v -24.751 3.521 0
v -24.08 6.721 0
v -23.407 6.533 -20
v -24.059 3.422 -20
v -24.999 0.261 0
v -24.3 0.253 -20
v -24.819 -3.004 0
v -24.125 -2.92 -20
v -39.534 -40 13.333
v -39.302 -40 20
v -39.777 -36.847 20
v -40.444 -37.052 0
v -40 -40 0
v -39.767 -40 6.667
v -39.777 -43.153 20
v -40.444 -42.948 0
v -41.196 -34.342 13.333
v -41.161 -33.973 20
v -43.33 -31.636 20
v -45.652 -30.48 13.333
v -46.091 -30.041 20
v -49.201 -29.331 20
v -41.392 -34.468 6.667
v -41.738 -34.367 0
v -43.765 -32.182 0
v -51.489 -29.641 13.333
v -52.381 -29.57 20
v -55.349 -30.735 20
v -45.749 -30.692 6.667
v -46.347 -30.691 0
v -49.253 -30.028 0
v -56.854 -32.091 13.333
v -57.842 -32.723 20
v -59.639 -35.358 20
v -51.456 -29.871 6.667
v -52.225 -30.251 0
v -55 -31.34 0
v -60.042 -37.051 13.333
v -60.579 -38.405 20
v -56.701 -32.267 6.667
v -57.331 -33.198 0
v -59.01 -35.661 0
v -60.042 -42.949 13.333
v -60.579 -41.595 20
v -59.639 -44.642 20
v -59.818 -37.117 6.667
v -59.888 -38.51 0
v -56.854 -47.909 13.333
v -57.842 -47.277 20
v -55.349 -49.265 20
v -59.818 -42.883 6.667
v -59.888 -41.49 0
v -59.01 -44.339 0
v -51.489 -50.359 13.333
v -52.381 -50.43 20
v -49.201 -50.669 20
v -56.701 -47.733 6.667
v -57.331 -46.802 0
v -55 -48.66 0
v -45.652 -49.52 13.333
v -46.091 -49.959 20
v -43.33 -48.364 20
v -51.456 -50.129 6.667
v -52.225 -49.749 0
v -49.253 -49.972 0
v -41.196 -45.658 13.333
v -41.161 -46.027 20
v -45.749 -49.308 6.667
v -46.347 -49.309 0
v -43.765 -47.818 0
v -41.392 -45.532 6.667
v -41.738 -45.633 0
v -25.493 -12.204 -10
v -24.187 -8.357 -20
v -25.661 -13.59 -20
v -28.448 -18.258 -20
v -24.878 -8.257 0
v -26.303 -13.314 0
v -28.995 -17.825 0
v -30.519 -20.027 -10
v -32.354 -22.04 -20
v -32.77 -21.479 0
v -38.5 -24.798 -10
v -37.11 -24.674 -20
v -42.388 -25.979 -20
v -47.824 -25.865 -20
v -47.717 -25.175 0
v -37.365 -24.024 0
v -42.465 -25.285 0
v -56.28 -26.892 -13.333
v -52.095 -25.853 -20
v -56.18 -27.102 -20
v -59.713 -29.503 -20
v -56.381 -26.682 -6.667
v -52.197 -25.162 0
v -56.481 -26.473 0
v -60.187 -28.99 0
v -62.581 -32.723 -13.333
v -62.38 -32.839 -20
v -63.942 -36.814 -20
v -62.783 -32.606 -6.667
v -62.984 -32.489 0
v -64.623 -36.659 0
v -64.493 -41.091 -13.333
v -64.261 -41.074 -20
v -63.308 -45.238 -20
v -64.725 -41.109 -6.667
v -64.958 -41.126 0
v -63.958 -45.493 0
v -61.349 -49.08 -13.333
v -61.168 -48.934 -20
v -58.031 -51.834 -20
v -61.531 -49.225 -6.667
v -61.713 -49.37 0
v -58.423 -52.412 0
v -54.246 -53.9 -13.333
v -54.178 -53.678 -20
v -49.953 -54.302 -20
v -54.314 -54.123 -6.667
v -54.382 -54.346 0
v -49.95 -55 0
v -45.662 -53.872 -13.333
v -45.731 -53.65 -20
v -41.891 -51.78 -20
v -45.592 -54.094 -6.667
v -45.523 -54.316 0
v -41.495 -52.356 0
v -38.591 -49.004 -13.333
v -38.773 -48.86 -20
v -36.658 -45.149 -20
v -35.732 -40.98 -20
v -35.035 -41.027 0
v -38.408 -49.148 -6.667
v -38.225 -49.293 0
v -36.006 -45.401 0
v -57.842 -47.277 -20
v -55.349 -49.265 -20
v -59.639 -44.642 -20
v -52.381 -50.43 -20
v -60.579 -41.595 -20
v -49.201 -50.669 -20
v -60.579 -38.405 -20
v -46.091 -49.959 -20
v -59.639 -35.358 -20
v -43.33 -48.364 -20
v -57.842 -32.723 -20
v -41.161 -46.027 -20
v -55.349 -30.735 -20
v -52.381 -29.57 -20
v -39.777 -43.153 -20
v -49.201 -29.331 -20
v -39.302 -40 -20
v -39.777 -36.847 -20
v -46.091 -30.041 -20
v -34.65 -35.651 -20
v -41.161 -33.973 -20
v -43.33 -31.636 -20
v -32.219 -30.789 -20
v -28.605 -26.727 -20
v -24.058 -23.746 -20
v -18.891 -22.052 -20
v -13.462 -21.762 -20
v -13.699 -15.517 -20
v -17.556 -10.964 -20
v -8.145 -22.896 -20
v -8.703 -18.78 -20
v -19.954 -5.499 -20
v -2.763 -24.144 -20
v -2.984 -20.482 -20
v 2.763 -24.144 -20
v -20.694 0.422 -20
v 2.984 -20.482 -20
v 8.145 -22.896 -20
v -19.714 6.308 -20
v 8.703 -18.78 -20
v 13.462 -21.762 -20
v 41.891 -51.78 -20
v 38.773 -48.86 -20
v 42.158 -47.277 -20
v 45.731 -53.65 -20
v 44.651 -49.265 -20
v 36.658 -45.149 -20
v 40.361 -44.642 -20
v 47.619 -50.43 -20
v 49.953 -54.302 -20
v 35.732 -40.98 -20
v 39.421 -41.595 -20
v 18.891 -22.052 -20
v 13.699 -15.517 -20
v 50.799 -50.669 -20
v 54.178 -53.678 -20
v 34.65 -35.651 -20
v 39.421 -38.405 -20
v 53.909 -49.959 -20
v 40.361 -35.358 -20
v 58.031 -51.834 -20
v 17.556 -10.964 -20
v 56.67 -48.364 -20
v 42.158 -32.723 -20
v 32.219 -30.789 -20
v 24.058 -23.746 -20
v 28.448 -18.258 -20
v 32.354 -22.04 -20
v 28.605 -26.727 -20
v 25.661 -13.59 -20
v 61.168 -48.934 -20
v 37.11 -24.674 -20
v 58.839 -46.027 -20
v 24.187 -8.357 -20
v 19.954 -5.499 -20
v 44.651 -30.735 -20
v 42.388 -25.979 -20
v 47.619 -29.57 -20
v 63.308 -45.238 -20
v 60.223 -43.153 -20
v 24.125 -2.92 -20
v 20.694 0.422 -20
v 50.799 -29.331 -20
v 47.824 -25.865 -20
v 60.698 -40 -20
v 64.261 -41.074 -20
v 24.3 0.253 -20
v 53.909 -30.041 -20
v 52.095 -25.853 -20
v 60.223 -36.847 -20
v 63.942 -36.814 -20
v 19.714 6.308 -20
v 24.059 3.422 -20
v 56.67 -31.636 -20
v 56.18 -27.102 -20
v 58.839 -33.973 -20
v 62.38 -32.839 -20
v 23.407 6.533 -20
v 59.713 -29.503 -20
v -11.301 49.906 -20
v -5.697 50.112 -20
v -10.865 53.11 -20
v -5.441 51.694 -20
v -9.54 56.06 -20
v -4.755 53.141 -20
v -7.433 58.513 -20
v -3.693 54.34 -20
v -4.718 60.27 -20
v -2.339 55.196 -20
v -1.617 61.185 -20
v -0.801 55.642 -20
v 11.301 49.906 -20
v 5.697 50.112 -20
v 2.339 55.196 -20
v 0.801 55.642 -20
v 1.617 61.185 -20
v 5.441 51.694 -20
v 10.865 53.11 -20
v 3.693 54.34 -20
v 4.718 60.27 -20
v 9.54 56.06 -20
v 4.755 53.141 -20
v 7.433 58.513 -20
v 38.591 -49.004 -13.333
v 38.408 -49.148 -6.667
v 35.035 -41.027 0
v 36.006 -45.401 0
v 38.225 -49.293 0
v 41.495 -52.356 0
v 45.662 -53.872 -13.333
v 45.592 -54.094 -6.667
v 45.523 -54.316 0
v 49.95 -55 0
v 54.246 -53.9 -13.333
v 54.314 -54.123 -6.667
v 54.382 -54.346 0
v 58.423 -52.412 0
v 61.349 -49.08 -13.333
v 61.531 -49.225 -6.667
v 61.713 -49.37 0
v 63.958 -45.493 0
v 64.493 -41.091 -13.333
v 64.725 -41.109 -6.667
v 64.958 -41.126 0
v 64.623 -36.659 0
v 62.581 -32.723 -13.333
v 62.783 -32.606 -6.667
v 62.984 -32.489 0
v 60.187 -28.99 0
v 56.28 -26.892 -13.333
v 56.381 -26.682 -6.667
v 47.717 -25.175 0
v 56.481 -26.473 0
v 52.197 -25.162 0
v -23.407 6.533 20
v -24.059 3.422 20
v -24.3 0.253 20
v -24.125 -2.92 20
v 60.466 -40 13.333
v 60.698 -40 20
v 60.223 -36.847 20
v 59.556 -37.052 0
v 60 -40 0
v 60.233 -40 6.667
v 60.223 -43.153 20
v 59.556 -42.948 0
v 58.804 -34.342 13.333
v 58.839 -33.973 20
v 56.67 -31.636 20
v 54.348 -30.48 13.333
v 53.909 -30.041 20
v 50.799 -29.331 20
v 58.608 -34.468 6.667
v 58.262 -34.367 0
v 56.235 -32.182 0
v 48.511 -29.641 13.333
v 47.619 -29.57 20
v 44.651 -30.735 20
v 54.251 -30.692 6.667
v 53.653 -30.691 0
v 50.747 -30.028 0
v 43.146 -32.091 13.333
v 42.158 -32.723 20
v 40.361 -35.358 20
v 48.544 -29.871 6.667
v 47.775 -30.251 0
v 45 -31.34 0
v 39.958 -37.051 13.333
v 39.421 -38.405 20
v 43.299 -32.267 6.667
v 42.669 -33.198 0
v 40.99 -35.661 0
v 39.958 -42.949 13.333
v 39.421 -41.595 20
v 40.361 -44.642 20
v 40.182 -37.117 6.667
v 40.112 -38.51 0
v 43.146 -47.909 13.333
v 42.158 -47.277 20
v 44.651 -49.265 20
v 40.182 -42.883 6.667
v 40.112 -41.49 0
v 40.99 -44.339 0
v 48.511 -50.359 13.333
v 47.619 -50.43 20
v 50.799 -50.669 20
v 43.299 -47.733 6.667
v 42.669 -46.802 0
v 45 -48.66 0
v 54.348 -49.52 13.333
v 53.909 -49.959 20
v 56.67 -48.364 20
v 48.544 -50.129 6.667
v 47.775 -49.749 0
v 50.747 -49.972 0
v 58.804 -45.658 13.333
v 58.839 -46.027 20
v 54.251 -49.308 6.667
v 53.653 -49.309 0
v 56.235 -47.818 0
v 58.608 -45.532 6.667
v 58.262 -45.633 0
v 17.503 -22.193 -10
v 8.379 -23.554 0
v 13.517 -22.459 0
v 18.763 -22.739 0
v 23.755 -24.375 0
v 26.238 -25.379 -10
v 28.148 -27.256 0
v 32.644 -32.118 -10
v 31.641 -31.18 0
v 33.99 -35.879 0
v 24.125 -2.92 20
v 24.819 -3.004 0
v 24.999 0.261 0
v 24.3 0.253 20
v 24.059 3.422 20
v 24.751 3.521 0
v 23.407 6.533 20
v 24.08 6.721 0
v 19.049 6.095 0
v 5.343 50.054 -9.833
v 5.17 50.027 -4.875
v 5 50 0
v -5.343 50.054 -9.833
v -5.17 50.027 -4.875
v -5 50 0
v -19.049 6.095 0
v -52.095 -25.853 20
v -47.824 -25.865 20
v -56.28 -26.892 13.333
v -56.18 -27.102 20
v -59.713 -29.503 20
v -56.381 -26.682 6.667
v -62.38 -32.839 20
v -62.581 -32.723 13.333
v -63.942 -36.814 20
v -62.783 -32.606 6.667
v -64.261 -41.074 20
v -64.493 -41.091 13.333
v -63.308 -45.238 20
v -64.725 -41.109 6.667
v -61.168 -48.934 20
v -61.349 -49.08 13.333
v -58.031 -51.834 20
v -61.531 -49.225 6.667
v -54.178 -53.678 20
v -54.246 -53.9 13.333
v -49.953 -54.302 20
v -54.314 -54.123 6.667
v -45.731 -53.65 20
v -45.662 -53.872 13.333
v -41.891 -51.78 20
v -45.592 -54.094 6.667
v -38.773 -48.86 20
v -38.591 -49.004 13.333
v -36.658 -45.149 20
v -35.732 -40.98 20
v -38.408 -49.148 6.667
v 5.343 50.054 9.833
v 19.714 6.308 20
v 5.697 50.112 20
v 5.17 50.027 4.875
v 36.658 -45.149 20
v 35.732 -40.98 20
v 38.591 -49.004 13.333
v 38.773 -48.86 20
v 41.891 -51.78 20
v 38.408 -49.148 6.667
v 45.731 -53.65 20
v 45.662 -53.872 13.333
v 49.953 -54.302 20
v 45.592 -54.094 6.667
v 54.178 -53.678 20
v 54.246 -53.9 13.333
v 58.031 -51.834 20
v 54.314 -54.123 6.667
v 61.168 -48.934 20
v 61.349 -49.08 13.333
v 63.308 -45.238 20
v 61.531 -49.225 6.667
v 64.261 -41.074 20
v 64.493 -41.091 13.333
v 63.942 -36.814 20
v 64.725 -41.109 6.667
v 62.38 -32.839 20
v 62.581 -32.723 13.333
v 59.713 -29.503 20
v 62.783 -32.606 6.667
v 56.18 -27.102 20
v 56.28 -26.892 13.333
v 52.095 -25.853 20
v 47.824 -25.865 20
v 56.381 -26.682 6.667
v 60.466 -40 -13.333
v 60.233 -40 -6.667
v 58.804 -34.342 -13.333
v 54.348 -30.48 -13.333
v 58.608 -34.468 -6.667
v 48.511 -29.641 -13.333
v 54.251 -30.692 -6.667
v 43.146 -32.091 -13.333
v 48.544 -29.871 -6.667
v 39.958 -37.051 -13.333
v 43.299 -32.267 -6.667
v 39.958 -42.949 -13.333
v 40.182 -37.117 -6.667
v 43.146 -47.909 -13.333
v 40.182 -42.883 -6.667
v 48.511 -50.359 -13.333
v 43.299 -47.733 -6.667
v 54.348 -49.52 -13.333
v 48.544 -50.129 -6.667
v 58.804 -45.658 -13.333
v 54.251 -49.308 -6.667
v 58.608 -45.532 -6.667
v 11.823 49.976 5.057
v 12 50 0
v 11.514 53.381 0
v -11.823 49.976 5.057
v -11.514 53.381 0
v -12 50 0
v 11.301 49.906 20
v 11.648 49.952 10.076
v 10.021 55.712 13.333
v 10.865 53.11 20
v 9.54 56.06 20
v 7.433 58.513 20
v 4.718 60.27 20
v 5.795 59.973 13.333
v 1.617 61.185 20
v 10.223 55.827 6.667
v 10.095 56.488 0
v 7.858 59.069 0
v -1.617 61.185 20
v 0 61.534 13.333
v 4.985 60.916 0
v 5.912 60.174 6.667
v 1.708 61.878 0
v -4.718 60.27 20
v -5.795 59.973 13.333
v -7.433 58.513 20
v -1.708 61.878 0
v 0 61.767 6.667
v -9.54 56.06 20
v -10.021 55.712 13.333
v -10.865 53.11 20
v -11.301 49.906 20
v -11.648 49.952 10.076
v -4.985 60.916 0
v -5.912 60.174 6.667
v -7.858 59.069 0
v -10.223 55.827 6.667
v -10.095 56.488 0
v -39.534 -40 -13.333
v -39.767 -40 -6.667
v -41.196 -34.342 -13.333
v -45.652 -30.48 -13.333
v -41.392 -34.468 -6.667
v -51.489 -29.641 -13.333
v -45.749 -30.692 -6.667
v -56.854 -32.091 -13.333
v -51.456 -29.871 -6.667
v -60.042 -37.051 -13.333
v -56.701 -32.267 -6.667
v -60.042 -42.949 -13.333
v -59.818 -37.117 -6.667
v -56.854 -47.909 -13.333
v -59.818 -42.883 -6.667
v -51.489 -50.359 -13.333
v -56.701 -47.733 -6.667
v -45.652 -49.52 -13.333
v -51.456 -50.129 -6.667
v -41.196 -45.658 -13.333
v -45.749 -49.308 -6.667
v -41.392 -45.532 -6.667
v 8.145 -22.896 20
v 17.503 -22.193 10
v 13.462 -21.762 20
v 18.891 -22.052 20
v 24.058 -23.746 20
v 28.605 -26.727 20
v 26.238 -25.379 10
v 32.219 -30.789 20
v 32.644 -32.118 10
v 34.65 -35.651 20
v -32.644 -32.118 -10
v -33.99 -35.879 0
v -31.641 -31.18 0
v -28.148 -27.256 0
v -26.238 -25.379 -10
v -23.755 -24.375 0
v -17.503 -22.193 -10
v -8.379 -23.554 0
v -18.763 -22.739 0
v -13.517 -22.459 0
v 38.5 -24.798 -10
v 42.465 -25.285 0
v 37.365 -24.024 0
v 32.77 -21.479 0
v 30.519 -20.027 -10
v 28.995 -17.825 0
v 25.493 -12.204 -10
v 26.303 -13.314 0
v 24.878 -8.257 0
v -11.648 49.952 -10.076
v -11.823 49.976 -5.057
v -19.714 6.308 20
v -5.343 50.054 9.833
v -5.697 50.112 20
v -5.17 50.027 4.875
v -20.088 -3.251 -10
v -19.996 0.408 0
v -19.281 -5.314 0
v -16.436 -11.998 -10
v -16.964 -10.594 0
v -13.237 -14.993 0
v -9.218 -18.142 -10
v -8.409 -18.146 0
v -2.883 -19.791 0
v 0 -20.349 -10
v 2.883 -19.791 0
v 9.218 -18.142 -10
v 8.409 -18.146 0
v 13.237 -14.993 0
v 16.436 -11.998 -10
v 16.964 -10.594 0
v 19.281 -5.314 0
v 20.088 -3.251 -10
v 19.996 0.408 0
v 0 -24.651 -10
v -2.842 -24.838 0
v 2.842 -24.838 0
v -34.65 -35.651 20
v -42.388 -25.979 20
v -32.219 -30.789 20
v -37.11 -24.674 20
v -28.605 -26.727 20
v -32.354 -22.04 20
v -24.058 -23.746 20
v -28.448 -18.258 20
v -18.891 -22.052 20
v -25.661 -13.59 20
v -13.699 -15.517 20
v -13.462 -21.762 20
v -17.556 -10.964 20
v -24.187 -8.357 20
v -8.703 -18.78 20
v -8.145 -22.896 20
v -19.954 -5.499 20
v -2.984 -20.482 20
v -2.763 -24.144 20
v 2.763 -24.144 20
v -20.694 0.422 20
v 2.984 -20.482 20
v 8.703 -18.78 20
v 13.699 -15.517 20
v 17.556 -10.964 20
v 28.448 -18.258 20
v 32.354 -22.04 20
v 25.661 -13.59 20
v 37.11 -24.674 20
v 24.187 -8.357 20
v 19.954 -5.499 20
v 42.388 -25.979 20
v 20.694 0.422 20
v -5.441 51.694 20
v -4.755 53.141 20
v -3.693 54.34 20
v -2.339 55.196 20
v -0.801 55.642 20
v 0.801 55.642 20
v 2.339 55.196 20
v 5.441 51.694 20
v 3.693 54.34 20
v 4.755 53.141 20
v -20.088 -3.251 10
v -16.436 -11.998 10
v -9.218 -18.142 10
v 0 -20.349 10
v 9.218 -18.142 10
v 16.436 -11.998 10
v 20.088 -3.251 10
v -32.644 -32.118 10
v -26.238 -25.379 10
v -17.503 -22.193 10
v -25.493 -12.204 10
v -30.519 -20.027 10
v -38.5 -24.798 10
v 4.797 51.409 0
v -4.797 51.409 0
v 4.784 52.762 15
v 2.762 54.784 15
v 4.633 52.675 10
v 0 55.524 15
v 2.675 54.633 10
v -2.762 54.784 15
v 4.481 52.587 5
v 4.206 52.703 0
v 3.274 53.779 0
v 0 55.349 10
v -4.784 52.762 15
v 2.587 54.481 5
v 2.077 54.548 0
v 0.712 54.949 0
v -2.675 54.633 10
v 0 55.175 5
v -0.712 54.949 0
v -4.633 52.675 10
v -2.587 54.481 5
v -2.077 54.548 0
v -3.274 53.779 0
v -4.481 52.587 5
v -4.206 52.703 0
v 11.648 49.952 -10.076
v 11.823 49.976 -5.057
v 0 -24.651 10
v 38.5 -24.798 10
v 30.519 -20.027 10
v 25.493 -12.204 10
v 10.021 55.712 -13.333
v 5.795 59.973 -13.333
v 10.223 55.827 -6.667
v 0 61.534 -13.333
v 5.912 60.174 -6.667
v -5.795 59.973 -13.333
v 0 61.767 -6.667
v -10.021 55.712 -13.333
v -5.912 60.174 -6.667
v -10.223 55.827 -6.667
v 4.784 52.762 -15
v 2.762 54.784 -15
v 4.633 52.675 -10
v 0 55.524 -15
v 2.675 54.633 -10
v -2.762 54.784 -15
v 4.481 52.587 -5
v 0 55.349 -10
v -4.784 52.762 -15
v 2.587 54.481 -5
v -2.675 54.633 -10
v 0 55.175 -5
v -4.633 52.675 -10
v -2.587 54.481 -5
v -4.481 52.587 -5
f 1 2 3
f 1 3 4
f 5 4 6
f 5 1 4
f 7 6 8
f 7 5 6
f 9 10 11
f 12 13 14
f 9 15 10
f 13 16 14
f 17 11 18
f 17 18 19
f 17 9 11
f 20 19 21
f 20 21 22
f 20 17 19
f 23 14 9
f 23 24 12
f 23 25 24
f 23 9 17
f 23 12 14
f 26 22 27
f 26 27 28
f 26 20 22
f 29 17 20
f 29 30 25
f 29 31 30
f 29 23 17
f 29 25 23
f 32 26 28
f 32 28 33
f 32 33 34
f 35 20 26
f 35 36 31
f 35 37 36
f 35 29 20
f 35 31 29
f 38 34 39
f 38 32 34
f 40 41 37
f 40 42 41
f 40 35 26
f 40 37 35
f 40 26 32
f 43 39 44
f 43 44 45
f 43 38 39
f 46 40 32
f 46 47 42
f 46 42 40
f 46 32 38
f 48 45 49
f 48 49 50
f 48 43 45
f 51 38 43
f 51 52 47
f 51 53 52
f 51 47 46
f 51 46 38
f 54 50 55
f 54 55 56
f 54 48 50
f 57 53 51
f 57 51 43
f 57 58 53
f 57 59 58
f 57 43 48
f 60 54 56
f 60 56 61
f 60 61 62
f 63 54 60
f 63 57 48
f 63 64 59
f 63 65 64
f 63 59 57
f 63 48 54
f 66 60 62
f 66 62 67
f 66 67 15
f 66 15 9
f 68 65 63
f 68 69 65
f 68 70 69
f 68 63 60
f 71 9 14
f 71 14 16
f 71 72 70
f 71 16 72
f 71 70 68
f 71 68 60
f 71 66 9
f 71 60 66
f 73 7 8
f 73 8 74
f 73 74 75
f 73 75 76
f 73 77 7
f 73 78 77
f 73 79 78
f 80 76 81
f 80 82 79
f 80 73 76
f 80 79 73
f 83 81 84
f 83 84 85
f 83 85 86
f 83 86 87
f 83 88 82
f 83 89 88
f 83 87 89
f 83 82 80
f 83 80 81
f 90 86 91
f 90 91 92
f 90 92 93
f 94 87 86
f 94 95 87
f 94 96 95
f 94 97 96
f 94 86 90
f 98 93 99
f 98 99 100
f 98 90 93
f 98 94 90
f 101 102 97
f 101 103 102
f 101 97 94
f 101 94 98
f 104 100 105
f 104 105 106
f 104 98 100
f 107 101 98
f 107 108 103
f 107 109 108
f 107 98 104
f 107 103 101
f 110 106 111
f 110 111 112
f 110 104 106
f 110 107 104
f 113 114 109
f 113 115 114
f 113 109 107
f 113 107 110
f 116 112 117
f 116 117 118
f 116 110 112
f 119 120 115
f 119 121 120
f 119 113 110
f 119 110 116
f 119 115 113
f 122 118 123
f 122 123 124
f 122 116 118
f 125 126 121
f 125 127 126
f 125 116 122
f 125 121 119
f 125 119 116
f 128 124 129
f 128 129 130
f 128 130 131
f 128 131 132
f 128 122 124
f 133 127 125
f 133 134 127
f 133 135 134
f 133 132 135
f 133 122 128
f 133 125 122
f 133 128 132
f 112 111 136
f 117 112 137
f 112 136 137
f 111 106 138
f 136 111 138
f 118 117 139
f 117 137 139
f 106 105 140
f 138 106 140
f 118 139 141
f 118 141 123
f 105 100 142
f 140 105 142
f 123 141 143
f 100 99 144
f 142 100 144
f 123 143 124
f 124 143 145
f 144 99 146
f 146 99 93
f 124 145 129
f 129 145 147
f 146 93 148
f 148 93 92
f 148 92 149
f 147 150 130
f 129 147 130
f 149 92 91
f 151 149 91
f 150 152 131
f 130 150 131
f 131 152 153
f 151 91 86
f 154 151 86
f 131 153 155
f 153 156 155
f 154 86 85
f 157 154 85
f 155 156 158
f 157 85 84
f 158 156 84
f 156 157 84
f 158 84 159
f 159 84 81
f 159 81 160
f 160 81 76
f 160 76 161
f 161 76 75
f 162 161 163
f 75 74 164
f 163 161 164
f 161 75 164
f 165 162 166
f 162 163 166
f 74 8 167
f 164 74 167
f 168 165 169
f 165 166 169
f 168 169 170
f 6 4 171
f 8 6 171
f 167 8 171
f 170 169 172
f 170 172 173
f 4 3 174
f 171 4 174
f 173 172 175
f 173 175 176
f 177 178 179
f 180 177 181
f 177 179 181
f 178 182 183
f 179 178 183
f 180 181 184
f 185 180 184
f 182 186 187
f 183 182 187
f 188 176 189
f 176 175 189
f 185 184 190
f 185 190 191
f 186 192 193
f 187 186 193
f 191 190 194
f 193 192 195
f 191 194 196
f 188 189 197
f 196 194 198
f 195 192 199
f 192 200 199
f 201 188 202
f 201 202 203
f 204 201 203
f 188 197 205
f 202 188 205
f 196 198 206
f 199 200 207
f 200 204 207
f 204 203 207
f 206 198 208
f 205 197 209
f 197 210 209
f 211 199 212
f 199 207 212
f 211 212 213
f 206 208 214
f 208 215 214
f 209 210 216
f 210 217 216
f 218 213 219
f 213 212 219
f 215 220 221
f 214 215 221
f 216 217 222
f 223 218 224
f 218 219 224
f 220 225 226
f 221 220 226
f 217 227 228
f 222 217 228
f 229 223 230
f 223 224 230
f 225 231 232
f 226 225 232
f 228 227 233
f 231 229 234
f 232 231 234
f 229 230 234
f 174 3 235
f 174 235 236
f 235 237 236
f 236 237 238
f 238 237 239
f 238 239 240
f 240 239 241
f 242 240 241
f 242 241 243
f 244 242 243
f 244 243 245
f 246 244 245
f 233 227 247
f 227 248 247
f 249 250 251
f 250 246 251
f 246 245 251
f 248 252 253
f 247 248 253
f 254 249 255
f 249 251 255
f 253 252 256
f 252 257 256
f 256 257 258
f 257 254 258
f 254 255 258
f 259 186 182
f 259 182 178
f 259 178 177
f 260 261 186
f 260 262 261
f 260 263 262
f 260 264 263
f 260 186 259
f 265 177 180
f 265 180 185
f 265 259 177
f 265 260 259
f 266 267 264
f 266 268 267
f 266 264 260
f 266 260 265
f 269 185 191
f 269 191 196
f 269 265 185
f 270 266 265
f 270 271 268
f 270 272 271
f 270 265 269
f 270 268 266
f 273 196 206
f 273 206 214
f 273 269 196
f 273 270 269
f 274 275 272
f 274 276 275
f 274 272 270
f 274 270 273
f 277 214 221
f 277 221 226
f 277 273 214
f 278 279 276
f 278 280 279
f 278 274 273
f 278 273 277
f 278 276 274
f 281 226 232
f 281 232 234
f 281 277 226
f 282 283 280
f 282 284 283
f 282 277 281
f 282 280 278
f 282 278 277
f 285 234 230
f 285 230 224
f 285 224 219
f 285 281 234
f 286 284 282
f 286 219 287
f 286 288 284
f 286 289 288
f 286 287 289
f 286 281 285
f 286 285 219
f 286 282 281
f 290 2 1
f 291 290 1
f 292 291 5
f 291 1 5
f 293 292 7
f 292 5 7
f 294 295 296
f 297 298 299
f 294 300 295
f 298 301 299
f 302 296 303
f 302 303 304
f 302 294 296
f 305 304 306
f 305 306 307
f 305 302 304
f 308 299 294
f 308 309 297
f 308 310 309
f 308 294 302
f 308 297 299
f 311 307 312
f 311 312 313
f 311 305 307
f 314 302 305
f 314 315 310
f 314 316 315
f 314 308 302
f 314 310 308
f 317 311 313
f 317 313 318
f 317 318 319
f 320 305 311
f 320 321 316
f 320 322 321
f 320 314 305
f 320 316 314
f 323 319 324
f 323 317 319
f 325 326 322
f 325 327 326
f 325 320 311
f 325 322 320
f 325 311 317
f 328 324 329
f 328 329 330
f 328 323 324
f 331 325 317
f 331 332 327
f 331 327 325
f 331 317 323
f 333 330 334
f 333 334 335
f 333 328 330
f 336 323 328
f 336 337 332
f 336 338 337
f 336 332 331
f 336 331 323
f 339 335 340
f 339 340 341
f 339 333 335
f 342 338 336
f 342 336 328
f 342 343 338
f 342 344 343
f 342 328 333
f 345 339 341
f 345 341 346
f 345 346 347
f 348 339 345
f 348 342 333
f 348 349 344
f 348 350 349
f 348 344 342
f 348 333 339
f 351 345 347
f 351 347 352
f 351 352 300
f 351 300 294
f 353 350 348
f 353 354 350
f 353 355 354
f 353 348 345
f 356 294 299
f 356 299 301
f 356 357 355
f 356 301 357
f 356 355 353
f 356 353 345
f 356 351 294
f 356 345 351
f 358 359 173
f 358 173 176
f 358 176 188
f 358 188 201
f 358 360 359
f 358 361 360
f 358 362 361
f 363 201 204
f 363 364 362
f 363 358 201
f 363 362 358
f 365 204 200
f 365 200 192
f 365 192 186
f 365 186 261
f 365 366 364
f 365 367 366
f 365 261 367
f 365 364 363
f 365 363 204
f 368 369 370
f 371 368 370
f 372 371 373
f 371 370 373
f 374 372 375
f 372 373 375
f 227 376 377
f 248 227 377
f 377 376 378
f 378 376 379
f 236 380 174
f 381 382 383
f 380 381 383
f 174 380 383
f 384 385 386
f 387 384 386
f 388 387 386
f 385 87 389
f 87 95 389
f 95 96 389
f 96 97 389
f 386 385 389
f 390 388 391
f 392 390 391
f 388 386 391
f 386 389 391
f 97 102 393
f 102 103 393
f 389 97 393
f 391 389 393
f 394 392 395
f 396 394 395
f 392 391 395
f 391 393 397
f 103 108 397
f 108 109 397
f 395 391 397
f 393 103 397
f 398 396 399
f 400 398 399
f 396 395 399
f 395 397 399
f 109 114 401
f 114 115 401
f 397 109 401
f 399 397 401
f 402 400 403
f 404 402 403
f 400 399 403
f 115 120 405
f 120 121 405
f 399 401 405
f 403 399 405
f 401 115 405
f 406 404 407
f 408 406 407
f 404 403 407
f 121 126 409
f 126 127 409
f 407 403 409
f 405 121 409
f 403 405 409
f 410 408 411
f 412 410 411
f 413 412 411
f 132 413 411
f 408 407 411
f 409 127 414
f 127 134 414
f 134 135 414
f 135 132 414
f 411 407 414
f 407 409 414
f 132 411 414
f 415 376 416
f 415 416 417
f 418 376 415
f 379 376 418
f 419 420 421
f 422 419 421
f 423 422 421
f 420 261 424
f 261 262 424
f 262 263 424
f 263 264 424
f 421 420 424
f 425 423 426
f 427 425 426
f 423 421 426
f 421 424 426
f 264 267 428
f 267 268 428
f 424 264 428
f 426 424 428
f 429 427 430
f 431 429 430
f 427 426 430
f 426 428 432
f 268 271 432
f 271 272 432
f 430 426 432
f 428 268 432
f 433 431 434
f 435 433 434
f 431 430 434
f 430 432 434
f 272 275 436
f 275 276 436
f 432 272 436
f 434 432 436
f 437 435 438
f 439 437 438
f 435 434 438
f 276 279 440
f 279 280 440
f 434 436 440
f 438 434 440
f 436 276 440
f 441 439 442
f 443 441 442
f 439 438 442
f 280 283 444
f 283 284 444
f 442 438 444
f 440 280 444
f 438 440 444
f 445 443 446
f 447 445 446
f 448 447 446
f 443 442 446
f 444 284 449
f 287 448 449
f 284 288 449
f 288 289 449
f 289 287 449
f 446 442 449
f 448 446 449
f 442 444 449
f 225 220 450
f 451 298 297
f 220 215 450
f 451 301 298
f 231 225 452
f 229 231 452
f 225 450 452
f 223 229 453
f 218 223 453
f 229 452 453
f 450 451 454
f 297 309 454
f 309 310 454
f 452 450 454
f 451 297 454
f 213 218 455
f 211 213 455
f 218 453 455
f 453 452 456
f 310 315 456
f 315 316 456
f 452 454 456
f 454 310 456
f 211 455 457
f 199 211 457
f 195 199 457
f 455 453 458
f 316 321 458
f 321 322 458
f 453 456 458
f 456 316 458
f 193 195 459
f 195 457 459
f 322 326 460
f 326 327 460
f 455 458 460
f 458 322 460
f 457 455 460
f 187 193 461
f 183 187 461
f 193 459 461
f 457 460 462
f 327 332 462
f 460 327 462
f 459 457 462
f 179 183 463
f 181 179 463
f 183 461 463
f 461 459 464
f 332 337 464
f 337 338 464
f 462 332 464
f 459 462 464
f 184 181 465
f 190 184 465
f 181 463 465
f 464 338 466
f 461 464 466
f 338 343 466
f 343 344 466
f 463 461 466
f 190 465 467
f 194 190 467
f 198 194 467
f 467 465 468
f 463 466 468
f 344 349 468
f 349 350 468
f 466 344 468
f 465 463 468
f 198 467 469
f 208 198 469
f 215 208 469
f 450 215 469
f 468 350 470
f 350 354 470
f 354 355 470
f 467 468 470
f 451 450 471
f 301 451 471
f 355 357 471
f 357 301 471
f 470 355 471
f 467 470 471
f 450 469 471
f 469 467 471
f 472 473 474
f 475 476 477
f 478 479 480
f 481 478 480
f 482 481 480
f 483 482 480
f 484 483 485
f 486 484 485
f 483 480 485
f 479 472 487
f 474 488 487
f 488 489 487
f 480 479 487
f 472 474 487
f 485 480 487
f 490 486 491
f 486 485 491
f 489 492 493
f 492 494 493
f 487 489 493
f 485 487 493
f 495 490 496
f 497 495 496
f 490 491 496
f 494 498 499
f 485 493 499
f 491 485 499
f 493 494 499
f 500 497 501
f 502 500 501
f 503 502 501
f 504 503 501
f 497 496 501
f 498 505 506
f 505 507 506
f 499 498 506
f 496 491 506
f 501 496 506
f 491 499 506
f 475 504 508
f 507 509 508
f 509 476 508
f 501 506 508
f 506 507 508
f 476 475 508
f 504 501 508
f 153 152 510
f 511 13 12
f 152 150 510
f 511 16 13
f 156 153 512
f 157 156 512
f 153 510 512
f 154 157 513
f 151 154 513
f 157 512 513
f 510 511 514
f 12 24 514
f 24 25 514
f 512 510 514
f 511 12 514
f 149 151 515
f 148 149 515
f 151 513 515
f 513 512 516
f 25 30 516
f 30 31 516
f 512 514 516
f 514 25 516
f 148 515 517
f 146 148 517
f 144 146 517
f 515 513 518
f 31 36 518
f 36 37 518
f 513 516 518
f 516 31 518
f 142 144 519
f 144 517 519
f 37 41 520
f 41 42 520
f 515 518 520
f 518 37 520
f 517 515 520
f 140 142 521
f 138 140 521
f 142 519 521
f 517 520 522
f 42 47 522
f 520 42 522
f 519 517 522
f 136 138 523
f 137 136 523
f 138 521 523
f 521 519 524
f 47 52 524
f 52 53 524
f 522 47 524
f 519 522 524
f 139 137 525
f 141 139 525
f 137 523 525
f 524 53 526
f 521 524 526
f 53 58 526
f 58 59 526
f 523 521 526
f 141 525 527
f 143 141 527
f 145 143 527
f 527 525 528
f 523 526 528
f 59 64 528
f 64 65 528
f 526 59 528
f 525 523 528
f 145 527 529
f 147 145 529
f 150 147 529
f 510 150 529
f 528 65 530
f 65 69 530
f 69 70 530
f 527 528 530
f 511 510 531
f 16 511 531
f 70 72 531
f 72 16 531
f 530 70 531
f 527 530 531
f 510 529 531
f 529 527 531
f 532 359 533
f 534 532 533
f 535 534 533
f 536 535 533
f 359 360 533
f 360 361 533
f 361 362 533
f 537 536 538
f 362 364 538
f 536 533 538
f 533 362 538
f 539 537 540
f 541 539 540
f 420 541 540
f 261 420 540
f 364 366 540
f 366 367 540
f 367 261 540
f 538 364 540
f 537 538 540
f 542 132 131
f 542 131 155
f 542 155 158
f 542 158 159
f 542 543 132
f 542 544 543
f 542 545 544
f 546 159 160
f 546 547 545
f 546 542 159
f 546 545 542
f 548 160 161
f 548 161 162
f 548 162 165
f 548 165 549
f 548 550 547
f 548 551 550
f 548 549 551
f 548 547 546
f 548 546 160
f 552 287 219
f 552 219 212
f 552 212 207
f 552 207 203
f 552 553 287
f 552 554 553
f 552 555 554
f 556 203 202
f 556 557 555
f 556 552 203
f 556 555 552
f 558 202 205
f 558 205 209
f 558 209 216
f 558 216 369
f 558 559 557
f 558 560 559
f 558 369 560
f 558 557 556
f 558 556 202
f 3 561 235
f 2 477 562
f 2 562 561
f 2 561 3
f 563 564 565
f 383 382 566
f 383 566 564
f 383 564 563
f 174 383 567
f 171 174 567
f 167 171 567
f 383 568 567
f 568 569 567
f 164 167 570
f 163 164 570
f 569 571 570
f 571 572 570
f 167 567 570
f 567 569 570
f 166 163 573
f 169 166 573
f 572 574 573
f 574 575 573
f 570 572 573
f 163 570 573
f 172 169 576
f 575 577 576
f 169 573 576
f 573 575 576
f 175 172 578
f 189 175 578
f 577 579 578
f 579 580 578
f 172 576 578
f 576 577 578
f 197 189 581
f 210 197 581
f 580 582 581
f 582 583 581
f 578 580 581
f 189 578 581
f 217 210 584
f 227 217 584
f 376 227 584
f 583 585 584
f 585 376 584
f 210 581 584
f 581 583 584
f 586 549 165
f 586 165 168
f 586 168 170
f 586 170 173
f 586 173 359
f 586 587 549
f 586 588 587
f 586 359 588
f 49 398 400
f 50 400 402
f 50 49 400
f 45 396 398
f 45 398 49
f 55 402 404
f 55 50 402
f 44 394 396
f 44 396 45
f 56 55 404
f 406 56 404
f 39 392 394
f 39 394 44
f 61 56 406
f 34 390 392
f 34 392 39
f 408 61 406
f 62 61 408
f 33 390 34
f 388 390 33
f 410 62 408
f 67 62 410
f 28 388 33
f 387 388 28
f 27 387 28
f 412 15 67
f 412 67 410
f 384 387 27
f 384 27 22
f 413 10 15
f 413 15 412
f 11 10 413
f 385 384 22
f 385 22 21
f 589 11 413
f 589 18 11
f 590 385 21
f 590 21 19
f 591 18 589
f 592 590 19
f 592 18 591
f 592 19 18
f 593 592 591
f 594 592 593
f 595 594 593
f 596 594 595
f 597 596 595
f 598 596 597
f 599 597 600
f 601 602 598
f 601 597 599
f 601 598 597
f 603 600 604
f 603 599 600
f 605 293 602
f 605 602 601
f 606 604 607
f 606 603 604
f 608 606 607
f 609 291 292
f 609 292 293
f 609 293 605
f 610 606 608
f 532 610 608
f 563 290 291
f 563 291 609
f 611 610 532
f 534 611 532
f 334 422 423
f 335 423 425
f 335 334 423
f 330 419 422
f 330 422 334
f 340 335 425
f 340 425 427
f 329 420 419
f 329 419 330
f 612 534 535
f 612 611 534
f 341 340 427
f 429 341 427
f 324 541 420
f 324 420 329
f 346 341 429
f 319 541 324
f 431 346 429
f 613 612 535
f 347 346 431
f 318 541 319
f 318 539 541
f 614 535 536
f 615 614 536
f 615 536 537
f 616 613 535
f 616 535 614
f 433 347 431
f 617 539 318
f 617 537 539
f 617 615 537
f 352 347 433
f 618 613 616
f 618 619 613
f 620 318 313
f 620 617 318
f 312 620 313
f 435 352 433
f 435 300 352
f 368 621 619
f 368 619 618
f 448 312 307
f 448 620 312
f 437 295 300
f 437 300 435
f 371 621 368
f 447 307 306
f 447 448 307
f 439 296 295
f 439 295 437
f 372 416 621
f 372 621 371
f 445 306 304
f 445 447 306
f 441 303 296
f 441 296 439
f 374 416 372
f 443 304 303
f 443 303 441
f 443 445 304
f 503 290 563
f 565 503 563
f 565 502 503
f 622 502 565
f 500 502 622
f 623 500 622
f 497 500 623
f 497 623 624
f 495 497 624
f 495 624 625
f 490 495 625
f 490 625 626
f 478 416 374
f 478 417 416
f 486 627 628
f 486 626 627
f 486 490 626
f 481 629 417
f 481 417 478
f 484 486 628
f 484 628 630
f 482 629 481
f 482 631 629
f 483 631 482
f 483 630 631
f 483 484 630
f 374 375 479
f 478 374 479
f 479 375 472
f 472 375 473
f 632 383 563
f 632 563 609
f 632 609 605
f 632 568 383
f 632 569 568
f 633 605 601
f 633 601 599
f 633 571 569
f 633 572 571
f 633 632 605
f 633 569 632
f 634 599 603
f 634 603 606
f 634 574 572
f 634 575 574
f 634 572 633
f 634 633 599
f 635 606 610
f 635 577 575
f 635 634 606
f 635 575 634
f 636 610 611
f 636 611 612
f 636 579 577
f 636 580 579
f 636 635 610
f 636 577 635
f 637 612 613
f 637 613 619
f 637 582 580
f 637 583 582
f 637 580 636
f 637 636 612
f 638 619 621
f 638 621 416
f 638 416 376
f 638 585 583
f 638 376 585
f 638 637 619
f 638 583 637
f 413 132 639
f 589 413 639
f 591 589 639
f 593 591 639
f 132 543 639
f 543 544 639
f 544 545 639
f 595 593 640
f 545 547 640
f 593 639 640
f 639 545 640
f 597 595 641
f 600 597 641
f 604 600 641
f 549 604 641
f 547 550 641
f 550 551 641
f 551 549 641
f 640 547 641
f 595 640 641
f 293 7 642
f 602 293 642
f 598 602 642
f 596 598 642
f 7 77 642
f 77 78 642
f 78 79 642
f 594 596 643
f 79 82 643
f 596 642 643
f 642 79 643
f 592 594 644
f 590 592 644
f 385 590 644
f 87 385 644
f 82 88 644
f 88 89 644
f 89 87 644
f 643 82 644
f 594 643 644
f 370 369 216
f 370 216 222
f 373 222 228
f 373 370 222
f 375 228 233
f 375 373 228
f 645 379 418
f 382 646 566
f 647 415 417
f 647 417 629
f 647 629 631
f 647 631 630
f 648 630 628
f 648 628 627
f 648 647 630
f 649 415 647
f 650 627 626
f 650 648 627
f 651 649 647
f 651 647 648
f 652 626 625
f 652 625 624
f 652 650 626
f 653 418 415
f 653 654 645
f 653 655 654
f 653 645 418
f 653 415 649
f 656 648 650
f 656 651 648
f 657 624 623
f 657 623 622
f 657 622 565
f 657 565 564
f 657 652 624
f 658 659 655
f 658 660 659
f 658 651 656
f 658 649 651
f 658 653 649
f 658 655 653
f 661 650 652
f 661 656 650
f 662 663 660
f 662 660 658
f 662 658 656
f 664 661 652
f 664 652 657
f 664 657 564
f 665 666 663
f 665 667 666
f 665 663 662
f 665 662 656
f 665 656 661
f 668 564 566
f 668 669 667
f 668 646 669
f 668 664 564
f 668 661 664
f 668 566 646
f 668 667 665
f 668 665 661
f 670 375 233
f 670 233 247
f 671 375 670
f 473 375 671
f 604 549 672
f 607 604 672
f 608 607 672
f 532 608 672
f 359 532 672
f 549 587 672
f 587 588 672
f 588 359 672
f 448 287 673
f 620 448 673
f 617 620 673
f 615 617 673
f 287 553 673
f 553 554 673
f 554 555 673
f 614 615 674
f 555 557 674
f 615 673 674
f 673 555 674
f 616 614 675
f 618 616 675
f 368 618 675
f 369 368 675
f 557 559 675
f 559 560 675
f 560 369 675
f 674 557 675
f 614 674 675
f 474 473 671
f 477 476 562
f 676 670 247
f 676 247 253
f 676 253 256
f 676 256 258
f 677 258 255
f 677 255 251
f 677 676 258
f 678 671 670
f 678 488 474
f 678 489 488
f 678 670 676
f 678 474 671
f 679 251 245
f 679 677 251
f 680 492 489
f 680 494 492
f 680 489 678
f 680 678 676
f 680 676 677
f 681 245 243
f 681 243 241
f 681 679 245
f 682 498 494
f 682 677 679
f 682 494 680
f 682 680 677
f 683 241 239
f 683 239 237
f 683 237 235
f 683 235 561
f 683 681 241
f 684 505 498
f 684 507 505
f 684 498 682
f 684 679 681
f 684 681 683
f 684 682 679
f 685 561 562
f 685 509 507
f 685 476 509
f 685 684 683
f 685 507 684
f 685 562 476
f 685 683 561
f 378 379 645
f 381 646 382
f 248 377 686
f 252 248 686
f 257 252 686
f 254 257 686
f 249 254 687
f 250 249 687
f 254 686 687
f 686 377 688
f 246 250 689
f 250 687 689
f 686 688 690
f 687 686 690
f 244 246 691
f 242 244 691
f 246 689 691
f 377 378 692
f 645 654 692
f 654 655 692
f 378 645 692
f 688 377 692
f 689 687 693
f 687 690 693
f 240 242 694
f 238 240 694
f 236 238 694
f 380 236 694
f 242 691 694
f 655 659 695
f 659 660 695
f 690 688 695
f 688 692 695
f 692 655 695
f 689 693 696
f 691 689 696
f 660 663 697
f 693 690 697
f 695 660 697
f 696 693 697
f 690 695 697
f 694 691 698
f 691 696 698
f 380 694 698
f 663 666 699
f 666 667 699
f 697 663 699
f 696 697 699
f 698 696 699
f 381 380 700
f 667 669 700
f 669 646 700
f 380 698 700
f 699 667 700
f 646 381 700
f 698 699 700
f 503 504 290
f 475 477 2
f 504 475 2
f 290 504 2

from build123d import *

# Parameters (mm, degrees)
SKETCH1_R                     = 10
BOSS_EXTRUDE1_DEPTH           = 20
BOSS_EXTRUDE1_DRAFT           = 2
BOSS_EXTRUDE1_OTHER_WAY_DEPTH = 20
BOSS_EXTRUDE1_OTHER_WAY_DRAFT = -2


with BuildPart() as part:
    # Sketch1 → Boss-Extrude1 (with draft: the straight prism first)
    with BuildSketch(Plane.XY):
        with BuildLine():
            Line((-12, 50), (-24.079653875, 6.72088307))
            ThreePointArc((-24.079653875, 6.72088307), (-24.928097247, 1.894721), (-24.81883517, -3.004233816))
            ThreePointArc((-24.81883517, -3.004233816), (-30.762049538, -19.776348187), (-47.717387131, -25.174694658))
            ThreePointArc((-47.717387131, -25.174694658), (-61.713032142, -49.370425713), (-35.03522611, -41.027395935))
            ThreePointArc((-35.03522611, -41.027395935), (-26.046643252, -25.670606045), (-8.378996809, -23.554031767))
            ThreePointArc((-8.378996809, -23.554031767), (0, -25), (8.378996809, -23.554031767))
            ThreePointArc((8.378996809, -23.554031767), (26.046643252, -25.670606045), (35.03522611, -41.027395935))
            ThreePointArc((35.03522611, -41.027395935), (61.713032142, -49.370425713), (47.717387131, -25.174694658))
            ThreePointArc((47.717387131, -25.174694658), (30.762049538, -19.776348187), (24.81883517, -3.004233816))
            ThreePointArc((24.81883517, -3.004233816), (24.928097247, 1.894721), (24.079653875, 6.72088307))
            Line((24.079653875, 6.72088307), (12, 50))
            ThreePointArc((12, 50), (0, 62), (-12, 50))
        make_face()
        with Locations((50, -40)):
            Circle(SKETCH1_R, mode=Mode.SUBTRACT)
        with Locations((-50, -40)):
            Circle(SKETCH1_R, mode=Mode.SUBTRACT)
        with BuildLine():
            ThreePointArc((5, 50), (0, 55), (-5, 50))
            Line((-5, 50), (-19.048602886, 6.095139711))
            ThreePointArc((-19.048602886, 6.095139711), (0, -20), (19.048602886, 6.095139711))
            Line((19.048602886, 6.095139711), (5, 50))
        make_face(mode=Mode.SUBTRACT)
    extrude(amount=BOSS_EXTRUDE1_DEPTH)
    # Boss-Extrude1: the draft: its side faces are tilted about the plane it starts from
    boss_extrude1_sides = [part.faces().sort_by_distance(p)[0] for p in [
        (24.928097247, 1.894721, 10),
        (18.039826938, 28.360441535, 10),
        (0, 62, 10),
        (-18.039826938, 28.360441535, 10),
        (-24.928097247, 1.894721, 10),
        (-30.762049538, -19.776348187, 10),
        (-61.713032142, -49.370425713, 10),
        (-26.046643252, -25.670606045, 10),
        (0, -25, 10),
        (26.046643252, -25.670606045, 10),
        (61.713032142, -49.370425713, 10),
        (30.762049538, -19.776348187, 10),
        (40, -40, 10),
        (-60, -40, 10),
        (0, -20, 10),
        (-12.024301443, 28.047569856, 10),
        (0, 55, 10),
        (12.024301443, 28.047569856, 10),
    ]]
    draft(boss_extrude1_sides, Plane.XY, BOSS_EXTRUDE1_DRAFT)


with BuildPart() as boss_extrude1_other_way_tool:
    # Sketch1 → Boss-Extrude1 other way (with draft: the straight prism first)
    with BuildSketch(Plane.XY):
        with BuildLine():
            Line((-12, 50), (-24.079653875, 6.72088307))
            ThreePointArc((-24.079653875, 6.72088307), (-24.928097247, 1.894721), (-24.81883517, -3.004233816))
            ThreePointArc((-24.81883517, -3.004233816), (-30.762049538, -19.776348187), (-47.717387131, -25.174694658))
            ThreePointArc((-47.717387131, -25.174694658), (-61.713032142, -49.370425713), (-35.03522611, -41.027395935))
            ThreePointArc((-35.03522611, -41.027395935), (-26.046643252, -25.670606045), (-8.378996809, -23.554031767))
            ThreePointArc((-8.378996809, -23.554031767), (0, -25), (8.378996809, -23.554031767))
            ThreePointArc((8.378996809, -23.554031767), (26.046643252, -25.670606045), (35.03522611, -41.027395935))
            ThreePointArc((35.03522611, -41.027395935), (61.713032142, -49.370425713), (47.717387131, -25.174694658))
            ThreePointArc((47.717387131, -25.174694658), (30.762049538, -19.776348187), (24.81883517, -3.004233816))
            ThreePointArc((24.81883517, -3.004233816), (24.928097247, 1.894721), (24.079653875, 6.72088307))
            Line((24.079653875, 6.72088307), (12, 50))
            ThreePointArc((12, 50), (0, 62), (-12, 50))
        make_face()
        with Locations((50, -40)):
            Circle(SKETCH1_R, mode=Mode.SUBTRACT)
        with Locations((-50, -40)):
            Circle(SKETCH1_R, mode=Mode.SUBTRACT)
        with BuildLine():
            ThreePointArc((5, 50), (0, 55), (-5, 50))
            Line((-5, 50), (-19.048602886, 6.095139711))
            ThreePointArc((-19.048602886, 6.095139711), (0, -20), (19.048602886, 6.095139711))
            Line((19.048602886, 6.095139711), (5, 50))
        make_face(mode=Mode.SUBTRACT)
    extrude(amount=-BOSS_EXTRUDE1_OTHER_WAY_DEPTH)
    # Boss-Extrude1 other way: the draft: its side faces are tilted about the plane it starts from
    boss_extrude1_other_way_sides = [boss_extrude1_other_way_tool.faces().sort_by_distance(p)[0] for p in [
        (24.928097247, 1.894721, -10),
        (18.039826938, 28.360441535, -10),
        (0, 62, -10),
        (-18.039826938, 28.360441535, -10),
        (-24.928097247, 1.894721, -10),
        (-30.762049538, -19.776348187, -10),
        (-61.713032142, -49.370425713, -10),
        (-26.046643252, -25.670606045, -10),
        (0, -25, -10),
        (26.046643252, -25.670606045, -10),
        (61.713032142, -49.370425713, -10),
        (30.762049538, -19.776348187, -10),
        (40, -40, -10),
        (-60, -40, -10),
        (0, -20, -10),
        (-12.024301443, 28.047569856, -10),
        (0, 55, -10),
        (12.024301443, 28.047569856, -10),
    ]]
    draft(boss_extrude1_other_way_sides, Plane.XY, BOSS_EXTRUDE1_OTHER_WAY_DRAFT)


with BuildPart() as part_1:
    add(part.part)

    # Boss-Extrude1 other way: add boss_extrude1_other_way_tool
    add(boss_extrude1_other_way_tool.part)


solid = part_1.part
